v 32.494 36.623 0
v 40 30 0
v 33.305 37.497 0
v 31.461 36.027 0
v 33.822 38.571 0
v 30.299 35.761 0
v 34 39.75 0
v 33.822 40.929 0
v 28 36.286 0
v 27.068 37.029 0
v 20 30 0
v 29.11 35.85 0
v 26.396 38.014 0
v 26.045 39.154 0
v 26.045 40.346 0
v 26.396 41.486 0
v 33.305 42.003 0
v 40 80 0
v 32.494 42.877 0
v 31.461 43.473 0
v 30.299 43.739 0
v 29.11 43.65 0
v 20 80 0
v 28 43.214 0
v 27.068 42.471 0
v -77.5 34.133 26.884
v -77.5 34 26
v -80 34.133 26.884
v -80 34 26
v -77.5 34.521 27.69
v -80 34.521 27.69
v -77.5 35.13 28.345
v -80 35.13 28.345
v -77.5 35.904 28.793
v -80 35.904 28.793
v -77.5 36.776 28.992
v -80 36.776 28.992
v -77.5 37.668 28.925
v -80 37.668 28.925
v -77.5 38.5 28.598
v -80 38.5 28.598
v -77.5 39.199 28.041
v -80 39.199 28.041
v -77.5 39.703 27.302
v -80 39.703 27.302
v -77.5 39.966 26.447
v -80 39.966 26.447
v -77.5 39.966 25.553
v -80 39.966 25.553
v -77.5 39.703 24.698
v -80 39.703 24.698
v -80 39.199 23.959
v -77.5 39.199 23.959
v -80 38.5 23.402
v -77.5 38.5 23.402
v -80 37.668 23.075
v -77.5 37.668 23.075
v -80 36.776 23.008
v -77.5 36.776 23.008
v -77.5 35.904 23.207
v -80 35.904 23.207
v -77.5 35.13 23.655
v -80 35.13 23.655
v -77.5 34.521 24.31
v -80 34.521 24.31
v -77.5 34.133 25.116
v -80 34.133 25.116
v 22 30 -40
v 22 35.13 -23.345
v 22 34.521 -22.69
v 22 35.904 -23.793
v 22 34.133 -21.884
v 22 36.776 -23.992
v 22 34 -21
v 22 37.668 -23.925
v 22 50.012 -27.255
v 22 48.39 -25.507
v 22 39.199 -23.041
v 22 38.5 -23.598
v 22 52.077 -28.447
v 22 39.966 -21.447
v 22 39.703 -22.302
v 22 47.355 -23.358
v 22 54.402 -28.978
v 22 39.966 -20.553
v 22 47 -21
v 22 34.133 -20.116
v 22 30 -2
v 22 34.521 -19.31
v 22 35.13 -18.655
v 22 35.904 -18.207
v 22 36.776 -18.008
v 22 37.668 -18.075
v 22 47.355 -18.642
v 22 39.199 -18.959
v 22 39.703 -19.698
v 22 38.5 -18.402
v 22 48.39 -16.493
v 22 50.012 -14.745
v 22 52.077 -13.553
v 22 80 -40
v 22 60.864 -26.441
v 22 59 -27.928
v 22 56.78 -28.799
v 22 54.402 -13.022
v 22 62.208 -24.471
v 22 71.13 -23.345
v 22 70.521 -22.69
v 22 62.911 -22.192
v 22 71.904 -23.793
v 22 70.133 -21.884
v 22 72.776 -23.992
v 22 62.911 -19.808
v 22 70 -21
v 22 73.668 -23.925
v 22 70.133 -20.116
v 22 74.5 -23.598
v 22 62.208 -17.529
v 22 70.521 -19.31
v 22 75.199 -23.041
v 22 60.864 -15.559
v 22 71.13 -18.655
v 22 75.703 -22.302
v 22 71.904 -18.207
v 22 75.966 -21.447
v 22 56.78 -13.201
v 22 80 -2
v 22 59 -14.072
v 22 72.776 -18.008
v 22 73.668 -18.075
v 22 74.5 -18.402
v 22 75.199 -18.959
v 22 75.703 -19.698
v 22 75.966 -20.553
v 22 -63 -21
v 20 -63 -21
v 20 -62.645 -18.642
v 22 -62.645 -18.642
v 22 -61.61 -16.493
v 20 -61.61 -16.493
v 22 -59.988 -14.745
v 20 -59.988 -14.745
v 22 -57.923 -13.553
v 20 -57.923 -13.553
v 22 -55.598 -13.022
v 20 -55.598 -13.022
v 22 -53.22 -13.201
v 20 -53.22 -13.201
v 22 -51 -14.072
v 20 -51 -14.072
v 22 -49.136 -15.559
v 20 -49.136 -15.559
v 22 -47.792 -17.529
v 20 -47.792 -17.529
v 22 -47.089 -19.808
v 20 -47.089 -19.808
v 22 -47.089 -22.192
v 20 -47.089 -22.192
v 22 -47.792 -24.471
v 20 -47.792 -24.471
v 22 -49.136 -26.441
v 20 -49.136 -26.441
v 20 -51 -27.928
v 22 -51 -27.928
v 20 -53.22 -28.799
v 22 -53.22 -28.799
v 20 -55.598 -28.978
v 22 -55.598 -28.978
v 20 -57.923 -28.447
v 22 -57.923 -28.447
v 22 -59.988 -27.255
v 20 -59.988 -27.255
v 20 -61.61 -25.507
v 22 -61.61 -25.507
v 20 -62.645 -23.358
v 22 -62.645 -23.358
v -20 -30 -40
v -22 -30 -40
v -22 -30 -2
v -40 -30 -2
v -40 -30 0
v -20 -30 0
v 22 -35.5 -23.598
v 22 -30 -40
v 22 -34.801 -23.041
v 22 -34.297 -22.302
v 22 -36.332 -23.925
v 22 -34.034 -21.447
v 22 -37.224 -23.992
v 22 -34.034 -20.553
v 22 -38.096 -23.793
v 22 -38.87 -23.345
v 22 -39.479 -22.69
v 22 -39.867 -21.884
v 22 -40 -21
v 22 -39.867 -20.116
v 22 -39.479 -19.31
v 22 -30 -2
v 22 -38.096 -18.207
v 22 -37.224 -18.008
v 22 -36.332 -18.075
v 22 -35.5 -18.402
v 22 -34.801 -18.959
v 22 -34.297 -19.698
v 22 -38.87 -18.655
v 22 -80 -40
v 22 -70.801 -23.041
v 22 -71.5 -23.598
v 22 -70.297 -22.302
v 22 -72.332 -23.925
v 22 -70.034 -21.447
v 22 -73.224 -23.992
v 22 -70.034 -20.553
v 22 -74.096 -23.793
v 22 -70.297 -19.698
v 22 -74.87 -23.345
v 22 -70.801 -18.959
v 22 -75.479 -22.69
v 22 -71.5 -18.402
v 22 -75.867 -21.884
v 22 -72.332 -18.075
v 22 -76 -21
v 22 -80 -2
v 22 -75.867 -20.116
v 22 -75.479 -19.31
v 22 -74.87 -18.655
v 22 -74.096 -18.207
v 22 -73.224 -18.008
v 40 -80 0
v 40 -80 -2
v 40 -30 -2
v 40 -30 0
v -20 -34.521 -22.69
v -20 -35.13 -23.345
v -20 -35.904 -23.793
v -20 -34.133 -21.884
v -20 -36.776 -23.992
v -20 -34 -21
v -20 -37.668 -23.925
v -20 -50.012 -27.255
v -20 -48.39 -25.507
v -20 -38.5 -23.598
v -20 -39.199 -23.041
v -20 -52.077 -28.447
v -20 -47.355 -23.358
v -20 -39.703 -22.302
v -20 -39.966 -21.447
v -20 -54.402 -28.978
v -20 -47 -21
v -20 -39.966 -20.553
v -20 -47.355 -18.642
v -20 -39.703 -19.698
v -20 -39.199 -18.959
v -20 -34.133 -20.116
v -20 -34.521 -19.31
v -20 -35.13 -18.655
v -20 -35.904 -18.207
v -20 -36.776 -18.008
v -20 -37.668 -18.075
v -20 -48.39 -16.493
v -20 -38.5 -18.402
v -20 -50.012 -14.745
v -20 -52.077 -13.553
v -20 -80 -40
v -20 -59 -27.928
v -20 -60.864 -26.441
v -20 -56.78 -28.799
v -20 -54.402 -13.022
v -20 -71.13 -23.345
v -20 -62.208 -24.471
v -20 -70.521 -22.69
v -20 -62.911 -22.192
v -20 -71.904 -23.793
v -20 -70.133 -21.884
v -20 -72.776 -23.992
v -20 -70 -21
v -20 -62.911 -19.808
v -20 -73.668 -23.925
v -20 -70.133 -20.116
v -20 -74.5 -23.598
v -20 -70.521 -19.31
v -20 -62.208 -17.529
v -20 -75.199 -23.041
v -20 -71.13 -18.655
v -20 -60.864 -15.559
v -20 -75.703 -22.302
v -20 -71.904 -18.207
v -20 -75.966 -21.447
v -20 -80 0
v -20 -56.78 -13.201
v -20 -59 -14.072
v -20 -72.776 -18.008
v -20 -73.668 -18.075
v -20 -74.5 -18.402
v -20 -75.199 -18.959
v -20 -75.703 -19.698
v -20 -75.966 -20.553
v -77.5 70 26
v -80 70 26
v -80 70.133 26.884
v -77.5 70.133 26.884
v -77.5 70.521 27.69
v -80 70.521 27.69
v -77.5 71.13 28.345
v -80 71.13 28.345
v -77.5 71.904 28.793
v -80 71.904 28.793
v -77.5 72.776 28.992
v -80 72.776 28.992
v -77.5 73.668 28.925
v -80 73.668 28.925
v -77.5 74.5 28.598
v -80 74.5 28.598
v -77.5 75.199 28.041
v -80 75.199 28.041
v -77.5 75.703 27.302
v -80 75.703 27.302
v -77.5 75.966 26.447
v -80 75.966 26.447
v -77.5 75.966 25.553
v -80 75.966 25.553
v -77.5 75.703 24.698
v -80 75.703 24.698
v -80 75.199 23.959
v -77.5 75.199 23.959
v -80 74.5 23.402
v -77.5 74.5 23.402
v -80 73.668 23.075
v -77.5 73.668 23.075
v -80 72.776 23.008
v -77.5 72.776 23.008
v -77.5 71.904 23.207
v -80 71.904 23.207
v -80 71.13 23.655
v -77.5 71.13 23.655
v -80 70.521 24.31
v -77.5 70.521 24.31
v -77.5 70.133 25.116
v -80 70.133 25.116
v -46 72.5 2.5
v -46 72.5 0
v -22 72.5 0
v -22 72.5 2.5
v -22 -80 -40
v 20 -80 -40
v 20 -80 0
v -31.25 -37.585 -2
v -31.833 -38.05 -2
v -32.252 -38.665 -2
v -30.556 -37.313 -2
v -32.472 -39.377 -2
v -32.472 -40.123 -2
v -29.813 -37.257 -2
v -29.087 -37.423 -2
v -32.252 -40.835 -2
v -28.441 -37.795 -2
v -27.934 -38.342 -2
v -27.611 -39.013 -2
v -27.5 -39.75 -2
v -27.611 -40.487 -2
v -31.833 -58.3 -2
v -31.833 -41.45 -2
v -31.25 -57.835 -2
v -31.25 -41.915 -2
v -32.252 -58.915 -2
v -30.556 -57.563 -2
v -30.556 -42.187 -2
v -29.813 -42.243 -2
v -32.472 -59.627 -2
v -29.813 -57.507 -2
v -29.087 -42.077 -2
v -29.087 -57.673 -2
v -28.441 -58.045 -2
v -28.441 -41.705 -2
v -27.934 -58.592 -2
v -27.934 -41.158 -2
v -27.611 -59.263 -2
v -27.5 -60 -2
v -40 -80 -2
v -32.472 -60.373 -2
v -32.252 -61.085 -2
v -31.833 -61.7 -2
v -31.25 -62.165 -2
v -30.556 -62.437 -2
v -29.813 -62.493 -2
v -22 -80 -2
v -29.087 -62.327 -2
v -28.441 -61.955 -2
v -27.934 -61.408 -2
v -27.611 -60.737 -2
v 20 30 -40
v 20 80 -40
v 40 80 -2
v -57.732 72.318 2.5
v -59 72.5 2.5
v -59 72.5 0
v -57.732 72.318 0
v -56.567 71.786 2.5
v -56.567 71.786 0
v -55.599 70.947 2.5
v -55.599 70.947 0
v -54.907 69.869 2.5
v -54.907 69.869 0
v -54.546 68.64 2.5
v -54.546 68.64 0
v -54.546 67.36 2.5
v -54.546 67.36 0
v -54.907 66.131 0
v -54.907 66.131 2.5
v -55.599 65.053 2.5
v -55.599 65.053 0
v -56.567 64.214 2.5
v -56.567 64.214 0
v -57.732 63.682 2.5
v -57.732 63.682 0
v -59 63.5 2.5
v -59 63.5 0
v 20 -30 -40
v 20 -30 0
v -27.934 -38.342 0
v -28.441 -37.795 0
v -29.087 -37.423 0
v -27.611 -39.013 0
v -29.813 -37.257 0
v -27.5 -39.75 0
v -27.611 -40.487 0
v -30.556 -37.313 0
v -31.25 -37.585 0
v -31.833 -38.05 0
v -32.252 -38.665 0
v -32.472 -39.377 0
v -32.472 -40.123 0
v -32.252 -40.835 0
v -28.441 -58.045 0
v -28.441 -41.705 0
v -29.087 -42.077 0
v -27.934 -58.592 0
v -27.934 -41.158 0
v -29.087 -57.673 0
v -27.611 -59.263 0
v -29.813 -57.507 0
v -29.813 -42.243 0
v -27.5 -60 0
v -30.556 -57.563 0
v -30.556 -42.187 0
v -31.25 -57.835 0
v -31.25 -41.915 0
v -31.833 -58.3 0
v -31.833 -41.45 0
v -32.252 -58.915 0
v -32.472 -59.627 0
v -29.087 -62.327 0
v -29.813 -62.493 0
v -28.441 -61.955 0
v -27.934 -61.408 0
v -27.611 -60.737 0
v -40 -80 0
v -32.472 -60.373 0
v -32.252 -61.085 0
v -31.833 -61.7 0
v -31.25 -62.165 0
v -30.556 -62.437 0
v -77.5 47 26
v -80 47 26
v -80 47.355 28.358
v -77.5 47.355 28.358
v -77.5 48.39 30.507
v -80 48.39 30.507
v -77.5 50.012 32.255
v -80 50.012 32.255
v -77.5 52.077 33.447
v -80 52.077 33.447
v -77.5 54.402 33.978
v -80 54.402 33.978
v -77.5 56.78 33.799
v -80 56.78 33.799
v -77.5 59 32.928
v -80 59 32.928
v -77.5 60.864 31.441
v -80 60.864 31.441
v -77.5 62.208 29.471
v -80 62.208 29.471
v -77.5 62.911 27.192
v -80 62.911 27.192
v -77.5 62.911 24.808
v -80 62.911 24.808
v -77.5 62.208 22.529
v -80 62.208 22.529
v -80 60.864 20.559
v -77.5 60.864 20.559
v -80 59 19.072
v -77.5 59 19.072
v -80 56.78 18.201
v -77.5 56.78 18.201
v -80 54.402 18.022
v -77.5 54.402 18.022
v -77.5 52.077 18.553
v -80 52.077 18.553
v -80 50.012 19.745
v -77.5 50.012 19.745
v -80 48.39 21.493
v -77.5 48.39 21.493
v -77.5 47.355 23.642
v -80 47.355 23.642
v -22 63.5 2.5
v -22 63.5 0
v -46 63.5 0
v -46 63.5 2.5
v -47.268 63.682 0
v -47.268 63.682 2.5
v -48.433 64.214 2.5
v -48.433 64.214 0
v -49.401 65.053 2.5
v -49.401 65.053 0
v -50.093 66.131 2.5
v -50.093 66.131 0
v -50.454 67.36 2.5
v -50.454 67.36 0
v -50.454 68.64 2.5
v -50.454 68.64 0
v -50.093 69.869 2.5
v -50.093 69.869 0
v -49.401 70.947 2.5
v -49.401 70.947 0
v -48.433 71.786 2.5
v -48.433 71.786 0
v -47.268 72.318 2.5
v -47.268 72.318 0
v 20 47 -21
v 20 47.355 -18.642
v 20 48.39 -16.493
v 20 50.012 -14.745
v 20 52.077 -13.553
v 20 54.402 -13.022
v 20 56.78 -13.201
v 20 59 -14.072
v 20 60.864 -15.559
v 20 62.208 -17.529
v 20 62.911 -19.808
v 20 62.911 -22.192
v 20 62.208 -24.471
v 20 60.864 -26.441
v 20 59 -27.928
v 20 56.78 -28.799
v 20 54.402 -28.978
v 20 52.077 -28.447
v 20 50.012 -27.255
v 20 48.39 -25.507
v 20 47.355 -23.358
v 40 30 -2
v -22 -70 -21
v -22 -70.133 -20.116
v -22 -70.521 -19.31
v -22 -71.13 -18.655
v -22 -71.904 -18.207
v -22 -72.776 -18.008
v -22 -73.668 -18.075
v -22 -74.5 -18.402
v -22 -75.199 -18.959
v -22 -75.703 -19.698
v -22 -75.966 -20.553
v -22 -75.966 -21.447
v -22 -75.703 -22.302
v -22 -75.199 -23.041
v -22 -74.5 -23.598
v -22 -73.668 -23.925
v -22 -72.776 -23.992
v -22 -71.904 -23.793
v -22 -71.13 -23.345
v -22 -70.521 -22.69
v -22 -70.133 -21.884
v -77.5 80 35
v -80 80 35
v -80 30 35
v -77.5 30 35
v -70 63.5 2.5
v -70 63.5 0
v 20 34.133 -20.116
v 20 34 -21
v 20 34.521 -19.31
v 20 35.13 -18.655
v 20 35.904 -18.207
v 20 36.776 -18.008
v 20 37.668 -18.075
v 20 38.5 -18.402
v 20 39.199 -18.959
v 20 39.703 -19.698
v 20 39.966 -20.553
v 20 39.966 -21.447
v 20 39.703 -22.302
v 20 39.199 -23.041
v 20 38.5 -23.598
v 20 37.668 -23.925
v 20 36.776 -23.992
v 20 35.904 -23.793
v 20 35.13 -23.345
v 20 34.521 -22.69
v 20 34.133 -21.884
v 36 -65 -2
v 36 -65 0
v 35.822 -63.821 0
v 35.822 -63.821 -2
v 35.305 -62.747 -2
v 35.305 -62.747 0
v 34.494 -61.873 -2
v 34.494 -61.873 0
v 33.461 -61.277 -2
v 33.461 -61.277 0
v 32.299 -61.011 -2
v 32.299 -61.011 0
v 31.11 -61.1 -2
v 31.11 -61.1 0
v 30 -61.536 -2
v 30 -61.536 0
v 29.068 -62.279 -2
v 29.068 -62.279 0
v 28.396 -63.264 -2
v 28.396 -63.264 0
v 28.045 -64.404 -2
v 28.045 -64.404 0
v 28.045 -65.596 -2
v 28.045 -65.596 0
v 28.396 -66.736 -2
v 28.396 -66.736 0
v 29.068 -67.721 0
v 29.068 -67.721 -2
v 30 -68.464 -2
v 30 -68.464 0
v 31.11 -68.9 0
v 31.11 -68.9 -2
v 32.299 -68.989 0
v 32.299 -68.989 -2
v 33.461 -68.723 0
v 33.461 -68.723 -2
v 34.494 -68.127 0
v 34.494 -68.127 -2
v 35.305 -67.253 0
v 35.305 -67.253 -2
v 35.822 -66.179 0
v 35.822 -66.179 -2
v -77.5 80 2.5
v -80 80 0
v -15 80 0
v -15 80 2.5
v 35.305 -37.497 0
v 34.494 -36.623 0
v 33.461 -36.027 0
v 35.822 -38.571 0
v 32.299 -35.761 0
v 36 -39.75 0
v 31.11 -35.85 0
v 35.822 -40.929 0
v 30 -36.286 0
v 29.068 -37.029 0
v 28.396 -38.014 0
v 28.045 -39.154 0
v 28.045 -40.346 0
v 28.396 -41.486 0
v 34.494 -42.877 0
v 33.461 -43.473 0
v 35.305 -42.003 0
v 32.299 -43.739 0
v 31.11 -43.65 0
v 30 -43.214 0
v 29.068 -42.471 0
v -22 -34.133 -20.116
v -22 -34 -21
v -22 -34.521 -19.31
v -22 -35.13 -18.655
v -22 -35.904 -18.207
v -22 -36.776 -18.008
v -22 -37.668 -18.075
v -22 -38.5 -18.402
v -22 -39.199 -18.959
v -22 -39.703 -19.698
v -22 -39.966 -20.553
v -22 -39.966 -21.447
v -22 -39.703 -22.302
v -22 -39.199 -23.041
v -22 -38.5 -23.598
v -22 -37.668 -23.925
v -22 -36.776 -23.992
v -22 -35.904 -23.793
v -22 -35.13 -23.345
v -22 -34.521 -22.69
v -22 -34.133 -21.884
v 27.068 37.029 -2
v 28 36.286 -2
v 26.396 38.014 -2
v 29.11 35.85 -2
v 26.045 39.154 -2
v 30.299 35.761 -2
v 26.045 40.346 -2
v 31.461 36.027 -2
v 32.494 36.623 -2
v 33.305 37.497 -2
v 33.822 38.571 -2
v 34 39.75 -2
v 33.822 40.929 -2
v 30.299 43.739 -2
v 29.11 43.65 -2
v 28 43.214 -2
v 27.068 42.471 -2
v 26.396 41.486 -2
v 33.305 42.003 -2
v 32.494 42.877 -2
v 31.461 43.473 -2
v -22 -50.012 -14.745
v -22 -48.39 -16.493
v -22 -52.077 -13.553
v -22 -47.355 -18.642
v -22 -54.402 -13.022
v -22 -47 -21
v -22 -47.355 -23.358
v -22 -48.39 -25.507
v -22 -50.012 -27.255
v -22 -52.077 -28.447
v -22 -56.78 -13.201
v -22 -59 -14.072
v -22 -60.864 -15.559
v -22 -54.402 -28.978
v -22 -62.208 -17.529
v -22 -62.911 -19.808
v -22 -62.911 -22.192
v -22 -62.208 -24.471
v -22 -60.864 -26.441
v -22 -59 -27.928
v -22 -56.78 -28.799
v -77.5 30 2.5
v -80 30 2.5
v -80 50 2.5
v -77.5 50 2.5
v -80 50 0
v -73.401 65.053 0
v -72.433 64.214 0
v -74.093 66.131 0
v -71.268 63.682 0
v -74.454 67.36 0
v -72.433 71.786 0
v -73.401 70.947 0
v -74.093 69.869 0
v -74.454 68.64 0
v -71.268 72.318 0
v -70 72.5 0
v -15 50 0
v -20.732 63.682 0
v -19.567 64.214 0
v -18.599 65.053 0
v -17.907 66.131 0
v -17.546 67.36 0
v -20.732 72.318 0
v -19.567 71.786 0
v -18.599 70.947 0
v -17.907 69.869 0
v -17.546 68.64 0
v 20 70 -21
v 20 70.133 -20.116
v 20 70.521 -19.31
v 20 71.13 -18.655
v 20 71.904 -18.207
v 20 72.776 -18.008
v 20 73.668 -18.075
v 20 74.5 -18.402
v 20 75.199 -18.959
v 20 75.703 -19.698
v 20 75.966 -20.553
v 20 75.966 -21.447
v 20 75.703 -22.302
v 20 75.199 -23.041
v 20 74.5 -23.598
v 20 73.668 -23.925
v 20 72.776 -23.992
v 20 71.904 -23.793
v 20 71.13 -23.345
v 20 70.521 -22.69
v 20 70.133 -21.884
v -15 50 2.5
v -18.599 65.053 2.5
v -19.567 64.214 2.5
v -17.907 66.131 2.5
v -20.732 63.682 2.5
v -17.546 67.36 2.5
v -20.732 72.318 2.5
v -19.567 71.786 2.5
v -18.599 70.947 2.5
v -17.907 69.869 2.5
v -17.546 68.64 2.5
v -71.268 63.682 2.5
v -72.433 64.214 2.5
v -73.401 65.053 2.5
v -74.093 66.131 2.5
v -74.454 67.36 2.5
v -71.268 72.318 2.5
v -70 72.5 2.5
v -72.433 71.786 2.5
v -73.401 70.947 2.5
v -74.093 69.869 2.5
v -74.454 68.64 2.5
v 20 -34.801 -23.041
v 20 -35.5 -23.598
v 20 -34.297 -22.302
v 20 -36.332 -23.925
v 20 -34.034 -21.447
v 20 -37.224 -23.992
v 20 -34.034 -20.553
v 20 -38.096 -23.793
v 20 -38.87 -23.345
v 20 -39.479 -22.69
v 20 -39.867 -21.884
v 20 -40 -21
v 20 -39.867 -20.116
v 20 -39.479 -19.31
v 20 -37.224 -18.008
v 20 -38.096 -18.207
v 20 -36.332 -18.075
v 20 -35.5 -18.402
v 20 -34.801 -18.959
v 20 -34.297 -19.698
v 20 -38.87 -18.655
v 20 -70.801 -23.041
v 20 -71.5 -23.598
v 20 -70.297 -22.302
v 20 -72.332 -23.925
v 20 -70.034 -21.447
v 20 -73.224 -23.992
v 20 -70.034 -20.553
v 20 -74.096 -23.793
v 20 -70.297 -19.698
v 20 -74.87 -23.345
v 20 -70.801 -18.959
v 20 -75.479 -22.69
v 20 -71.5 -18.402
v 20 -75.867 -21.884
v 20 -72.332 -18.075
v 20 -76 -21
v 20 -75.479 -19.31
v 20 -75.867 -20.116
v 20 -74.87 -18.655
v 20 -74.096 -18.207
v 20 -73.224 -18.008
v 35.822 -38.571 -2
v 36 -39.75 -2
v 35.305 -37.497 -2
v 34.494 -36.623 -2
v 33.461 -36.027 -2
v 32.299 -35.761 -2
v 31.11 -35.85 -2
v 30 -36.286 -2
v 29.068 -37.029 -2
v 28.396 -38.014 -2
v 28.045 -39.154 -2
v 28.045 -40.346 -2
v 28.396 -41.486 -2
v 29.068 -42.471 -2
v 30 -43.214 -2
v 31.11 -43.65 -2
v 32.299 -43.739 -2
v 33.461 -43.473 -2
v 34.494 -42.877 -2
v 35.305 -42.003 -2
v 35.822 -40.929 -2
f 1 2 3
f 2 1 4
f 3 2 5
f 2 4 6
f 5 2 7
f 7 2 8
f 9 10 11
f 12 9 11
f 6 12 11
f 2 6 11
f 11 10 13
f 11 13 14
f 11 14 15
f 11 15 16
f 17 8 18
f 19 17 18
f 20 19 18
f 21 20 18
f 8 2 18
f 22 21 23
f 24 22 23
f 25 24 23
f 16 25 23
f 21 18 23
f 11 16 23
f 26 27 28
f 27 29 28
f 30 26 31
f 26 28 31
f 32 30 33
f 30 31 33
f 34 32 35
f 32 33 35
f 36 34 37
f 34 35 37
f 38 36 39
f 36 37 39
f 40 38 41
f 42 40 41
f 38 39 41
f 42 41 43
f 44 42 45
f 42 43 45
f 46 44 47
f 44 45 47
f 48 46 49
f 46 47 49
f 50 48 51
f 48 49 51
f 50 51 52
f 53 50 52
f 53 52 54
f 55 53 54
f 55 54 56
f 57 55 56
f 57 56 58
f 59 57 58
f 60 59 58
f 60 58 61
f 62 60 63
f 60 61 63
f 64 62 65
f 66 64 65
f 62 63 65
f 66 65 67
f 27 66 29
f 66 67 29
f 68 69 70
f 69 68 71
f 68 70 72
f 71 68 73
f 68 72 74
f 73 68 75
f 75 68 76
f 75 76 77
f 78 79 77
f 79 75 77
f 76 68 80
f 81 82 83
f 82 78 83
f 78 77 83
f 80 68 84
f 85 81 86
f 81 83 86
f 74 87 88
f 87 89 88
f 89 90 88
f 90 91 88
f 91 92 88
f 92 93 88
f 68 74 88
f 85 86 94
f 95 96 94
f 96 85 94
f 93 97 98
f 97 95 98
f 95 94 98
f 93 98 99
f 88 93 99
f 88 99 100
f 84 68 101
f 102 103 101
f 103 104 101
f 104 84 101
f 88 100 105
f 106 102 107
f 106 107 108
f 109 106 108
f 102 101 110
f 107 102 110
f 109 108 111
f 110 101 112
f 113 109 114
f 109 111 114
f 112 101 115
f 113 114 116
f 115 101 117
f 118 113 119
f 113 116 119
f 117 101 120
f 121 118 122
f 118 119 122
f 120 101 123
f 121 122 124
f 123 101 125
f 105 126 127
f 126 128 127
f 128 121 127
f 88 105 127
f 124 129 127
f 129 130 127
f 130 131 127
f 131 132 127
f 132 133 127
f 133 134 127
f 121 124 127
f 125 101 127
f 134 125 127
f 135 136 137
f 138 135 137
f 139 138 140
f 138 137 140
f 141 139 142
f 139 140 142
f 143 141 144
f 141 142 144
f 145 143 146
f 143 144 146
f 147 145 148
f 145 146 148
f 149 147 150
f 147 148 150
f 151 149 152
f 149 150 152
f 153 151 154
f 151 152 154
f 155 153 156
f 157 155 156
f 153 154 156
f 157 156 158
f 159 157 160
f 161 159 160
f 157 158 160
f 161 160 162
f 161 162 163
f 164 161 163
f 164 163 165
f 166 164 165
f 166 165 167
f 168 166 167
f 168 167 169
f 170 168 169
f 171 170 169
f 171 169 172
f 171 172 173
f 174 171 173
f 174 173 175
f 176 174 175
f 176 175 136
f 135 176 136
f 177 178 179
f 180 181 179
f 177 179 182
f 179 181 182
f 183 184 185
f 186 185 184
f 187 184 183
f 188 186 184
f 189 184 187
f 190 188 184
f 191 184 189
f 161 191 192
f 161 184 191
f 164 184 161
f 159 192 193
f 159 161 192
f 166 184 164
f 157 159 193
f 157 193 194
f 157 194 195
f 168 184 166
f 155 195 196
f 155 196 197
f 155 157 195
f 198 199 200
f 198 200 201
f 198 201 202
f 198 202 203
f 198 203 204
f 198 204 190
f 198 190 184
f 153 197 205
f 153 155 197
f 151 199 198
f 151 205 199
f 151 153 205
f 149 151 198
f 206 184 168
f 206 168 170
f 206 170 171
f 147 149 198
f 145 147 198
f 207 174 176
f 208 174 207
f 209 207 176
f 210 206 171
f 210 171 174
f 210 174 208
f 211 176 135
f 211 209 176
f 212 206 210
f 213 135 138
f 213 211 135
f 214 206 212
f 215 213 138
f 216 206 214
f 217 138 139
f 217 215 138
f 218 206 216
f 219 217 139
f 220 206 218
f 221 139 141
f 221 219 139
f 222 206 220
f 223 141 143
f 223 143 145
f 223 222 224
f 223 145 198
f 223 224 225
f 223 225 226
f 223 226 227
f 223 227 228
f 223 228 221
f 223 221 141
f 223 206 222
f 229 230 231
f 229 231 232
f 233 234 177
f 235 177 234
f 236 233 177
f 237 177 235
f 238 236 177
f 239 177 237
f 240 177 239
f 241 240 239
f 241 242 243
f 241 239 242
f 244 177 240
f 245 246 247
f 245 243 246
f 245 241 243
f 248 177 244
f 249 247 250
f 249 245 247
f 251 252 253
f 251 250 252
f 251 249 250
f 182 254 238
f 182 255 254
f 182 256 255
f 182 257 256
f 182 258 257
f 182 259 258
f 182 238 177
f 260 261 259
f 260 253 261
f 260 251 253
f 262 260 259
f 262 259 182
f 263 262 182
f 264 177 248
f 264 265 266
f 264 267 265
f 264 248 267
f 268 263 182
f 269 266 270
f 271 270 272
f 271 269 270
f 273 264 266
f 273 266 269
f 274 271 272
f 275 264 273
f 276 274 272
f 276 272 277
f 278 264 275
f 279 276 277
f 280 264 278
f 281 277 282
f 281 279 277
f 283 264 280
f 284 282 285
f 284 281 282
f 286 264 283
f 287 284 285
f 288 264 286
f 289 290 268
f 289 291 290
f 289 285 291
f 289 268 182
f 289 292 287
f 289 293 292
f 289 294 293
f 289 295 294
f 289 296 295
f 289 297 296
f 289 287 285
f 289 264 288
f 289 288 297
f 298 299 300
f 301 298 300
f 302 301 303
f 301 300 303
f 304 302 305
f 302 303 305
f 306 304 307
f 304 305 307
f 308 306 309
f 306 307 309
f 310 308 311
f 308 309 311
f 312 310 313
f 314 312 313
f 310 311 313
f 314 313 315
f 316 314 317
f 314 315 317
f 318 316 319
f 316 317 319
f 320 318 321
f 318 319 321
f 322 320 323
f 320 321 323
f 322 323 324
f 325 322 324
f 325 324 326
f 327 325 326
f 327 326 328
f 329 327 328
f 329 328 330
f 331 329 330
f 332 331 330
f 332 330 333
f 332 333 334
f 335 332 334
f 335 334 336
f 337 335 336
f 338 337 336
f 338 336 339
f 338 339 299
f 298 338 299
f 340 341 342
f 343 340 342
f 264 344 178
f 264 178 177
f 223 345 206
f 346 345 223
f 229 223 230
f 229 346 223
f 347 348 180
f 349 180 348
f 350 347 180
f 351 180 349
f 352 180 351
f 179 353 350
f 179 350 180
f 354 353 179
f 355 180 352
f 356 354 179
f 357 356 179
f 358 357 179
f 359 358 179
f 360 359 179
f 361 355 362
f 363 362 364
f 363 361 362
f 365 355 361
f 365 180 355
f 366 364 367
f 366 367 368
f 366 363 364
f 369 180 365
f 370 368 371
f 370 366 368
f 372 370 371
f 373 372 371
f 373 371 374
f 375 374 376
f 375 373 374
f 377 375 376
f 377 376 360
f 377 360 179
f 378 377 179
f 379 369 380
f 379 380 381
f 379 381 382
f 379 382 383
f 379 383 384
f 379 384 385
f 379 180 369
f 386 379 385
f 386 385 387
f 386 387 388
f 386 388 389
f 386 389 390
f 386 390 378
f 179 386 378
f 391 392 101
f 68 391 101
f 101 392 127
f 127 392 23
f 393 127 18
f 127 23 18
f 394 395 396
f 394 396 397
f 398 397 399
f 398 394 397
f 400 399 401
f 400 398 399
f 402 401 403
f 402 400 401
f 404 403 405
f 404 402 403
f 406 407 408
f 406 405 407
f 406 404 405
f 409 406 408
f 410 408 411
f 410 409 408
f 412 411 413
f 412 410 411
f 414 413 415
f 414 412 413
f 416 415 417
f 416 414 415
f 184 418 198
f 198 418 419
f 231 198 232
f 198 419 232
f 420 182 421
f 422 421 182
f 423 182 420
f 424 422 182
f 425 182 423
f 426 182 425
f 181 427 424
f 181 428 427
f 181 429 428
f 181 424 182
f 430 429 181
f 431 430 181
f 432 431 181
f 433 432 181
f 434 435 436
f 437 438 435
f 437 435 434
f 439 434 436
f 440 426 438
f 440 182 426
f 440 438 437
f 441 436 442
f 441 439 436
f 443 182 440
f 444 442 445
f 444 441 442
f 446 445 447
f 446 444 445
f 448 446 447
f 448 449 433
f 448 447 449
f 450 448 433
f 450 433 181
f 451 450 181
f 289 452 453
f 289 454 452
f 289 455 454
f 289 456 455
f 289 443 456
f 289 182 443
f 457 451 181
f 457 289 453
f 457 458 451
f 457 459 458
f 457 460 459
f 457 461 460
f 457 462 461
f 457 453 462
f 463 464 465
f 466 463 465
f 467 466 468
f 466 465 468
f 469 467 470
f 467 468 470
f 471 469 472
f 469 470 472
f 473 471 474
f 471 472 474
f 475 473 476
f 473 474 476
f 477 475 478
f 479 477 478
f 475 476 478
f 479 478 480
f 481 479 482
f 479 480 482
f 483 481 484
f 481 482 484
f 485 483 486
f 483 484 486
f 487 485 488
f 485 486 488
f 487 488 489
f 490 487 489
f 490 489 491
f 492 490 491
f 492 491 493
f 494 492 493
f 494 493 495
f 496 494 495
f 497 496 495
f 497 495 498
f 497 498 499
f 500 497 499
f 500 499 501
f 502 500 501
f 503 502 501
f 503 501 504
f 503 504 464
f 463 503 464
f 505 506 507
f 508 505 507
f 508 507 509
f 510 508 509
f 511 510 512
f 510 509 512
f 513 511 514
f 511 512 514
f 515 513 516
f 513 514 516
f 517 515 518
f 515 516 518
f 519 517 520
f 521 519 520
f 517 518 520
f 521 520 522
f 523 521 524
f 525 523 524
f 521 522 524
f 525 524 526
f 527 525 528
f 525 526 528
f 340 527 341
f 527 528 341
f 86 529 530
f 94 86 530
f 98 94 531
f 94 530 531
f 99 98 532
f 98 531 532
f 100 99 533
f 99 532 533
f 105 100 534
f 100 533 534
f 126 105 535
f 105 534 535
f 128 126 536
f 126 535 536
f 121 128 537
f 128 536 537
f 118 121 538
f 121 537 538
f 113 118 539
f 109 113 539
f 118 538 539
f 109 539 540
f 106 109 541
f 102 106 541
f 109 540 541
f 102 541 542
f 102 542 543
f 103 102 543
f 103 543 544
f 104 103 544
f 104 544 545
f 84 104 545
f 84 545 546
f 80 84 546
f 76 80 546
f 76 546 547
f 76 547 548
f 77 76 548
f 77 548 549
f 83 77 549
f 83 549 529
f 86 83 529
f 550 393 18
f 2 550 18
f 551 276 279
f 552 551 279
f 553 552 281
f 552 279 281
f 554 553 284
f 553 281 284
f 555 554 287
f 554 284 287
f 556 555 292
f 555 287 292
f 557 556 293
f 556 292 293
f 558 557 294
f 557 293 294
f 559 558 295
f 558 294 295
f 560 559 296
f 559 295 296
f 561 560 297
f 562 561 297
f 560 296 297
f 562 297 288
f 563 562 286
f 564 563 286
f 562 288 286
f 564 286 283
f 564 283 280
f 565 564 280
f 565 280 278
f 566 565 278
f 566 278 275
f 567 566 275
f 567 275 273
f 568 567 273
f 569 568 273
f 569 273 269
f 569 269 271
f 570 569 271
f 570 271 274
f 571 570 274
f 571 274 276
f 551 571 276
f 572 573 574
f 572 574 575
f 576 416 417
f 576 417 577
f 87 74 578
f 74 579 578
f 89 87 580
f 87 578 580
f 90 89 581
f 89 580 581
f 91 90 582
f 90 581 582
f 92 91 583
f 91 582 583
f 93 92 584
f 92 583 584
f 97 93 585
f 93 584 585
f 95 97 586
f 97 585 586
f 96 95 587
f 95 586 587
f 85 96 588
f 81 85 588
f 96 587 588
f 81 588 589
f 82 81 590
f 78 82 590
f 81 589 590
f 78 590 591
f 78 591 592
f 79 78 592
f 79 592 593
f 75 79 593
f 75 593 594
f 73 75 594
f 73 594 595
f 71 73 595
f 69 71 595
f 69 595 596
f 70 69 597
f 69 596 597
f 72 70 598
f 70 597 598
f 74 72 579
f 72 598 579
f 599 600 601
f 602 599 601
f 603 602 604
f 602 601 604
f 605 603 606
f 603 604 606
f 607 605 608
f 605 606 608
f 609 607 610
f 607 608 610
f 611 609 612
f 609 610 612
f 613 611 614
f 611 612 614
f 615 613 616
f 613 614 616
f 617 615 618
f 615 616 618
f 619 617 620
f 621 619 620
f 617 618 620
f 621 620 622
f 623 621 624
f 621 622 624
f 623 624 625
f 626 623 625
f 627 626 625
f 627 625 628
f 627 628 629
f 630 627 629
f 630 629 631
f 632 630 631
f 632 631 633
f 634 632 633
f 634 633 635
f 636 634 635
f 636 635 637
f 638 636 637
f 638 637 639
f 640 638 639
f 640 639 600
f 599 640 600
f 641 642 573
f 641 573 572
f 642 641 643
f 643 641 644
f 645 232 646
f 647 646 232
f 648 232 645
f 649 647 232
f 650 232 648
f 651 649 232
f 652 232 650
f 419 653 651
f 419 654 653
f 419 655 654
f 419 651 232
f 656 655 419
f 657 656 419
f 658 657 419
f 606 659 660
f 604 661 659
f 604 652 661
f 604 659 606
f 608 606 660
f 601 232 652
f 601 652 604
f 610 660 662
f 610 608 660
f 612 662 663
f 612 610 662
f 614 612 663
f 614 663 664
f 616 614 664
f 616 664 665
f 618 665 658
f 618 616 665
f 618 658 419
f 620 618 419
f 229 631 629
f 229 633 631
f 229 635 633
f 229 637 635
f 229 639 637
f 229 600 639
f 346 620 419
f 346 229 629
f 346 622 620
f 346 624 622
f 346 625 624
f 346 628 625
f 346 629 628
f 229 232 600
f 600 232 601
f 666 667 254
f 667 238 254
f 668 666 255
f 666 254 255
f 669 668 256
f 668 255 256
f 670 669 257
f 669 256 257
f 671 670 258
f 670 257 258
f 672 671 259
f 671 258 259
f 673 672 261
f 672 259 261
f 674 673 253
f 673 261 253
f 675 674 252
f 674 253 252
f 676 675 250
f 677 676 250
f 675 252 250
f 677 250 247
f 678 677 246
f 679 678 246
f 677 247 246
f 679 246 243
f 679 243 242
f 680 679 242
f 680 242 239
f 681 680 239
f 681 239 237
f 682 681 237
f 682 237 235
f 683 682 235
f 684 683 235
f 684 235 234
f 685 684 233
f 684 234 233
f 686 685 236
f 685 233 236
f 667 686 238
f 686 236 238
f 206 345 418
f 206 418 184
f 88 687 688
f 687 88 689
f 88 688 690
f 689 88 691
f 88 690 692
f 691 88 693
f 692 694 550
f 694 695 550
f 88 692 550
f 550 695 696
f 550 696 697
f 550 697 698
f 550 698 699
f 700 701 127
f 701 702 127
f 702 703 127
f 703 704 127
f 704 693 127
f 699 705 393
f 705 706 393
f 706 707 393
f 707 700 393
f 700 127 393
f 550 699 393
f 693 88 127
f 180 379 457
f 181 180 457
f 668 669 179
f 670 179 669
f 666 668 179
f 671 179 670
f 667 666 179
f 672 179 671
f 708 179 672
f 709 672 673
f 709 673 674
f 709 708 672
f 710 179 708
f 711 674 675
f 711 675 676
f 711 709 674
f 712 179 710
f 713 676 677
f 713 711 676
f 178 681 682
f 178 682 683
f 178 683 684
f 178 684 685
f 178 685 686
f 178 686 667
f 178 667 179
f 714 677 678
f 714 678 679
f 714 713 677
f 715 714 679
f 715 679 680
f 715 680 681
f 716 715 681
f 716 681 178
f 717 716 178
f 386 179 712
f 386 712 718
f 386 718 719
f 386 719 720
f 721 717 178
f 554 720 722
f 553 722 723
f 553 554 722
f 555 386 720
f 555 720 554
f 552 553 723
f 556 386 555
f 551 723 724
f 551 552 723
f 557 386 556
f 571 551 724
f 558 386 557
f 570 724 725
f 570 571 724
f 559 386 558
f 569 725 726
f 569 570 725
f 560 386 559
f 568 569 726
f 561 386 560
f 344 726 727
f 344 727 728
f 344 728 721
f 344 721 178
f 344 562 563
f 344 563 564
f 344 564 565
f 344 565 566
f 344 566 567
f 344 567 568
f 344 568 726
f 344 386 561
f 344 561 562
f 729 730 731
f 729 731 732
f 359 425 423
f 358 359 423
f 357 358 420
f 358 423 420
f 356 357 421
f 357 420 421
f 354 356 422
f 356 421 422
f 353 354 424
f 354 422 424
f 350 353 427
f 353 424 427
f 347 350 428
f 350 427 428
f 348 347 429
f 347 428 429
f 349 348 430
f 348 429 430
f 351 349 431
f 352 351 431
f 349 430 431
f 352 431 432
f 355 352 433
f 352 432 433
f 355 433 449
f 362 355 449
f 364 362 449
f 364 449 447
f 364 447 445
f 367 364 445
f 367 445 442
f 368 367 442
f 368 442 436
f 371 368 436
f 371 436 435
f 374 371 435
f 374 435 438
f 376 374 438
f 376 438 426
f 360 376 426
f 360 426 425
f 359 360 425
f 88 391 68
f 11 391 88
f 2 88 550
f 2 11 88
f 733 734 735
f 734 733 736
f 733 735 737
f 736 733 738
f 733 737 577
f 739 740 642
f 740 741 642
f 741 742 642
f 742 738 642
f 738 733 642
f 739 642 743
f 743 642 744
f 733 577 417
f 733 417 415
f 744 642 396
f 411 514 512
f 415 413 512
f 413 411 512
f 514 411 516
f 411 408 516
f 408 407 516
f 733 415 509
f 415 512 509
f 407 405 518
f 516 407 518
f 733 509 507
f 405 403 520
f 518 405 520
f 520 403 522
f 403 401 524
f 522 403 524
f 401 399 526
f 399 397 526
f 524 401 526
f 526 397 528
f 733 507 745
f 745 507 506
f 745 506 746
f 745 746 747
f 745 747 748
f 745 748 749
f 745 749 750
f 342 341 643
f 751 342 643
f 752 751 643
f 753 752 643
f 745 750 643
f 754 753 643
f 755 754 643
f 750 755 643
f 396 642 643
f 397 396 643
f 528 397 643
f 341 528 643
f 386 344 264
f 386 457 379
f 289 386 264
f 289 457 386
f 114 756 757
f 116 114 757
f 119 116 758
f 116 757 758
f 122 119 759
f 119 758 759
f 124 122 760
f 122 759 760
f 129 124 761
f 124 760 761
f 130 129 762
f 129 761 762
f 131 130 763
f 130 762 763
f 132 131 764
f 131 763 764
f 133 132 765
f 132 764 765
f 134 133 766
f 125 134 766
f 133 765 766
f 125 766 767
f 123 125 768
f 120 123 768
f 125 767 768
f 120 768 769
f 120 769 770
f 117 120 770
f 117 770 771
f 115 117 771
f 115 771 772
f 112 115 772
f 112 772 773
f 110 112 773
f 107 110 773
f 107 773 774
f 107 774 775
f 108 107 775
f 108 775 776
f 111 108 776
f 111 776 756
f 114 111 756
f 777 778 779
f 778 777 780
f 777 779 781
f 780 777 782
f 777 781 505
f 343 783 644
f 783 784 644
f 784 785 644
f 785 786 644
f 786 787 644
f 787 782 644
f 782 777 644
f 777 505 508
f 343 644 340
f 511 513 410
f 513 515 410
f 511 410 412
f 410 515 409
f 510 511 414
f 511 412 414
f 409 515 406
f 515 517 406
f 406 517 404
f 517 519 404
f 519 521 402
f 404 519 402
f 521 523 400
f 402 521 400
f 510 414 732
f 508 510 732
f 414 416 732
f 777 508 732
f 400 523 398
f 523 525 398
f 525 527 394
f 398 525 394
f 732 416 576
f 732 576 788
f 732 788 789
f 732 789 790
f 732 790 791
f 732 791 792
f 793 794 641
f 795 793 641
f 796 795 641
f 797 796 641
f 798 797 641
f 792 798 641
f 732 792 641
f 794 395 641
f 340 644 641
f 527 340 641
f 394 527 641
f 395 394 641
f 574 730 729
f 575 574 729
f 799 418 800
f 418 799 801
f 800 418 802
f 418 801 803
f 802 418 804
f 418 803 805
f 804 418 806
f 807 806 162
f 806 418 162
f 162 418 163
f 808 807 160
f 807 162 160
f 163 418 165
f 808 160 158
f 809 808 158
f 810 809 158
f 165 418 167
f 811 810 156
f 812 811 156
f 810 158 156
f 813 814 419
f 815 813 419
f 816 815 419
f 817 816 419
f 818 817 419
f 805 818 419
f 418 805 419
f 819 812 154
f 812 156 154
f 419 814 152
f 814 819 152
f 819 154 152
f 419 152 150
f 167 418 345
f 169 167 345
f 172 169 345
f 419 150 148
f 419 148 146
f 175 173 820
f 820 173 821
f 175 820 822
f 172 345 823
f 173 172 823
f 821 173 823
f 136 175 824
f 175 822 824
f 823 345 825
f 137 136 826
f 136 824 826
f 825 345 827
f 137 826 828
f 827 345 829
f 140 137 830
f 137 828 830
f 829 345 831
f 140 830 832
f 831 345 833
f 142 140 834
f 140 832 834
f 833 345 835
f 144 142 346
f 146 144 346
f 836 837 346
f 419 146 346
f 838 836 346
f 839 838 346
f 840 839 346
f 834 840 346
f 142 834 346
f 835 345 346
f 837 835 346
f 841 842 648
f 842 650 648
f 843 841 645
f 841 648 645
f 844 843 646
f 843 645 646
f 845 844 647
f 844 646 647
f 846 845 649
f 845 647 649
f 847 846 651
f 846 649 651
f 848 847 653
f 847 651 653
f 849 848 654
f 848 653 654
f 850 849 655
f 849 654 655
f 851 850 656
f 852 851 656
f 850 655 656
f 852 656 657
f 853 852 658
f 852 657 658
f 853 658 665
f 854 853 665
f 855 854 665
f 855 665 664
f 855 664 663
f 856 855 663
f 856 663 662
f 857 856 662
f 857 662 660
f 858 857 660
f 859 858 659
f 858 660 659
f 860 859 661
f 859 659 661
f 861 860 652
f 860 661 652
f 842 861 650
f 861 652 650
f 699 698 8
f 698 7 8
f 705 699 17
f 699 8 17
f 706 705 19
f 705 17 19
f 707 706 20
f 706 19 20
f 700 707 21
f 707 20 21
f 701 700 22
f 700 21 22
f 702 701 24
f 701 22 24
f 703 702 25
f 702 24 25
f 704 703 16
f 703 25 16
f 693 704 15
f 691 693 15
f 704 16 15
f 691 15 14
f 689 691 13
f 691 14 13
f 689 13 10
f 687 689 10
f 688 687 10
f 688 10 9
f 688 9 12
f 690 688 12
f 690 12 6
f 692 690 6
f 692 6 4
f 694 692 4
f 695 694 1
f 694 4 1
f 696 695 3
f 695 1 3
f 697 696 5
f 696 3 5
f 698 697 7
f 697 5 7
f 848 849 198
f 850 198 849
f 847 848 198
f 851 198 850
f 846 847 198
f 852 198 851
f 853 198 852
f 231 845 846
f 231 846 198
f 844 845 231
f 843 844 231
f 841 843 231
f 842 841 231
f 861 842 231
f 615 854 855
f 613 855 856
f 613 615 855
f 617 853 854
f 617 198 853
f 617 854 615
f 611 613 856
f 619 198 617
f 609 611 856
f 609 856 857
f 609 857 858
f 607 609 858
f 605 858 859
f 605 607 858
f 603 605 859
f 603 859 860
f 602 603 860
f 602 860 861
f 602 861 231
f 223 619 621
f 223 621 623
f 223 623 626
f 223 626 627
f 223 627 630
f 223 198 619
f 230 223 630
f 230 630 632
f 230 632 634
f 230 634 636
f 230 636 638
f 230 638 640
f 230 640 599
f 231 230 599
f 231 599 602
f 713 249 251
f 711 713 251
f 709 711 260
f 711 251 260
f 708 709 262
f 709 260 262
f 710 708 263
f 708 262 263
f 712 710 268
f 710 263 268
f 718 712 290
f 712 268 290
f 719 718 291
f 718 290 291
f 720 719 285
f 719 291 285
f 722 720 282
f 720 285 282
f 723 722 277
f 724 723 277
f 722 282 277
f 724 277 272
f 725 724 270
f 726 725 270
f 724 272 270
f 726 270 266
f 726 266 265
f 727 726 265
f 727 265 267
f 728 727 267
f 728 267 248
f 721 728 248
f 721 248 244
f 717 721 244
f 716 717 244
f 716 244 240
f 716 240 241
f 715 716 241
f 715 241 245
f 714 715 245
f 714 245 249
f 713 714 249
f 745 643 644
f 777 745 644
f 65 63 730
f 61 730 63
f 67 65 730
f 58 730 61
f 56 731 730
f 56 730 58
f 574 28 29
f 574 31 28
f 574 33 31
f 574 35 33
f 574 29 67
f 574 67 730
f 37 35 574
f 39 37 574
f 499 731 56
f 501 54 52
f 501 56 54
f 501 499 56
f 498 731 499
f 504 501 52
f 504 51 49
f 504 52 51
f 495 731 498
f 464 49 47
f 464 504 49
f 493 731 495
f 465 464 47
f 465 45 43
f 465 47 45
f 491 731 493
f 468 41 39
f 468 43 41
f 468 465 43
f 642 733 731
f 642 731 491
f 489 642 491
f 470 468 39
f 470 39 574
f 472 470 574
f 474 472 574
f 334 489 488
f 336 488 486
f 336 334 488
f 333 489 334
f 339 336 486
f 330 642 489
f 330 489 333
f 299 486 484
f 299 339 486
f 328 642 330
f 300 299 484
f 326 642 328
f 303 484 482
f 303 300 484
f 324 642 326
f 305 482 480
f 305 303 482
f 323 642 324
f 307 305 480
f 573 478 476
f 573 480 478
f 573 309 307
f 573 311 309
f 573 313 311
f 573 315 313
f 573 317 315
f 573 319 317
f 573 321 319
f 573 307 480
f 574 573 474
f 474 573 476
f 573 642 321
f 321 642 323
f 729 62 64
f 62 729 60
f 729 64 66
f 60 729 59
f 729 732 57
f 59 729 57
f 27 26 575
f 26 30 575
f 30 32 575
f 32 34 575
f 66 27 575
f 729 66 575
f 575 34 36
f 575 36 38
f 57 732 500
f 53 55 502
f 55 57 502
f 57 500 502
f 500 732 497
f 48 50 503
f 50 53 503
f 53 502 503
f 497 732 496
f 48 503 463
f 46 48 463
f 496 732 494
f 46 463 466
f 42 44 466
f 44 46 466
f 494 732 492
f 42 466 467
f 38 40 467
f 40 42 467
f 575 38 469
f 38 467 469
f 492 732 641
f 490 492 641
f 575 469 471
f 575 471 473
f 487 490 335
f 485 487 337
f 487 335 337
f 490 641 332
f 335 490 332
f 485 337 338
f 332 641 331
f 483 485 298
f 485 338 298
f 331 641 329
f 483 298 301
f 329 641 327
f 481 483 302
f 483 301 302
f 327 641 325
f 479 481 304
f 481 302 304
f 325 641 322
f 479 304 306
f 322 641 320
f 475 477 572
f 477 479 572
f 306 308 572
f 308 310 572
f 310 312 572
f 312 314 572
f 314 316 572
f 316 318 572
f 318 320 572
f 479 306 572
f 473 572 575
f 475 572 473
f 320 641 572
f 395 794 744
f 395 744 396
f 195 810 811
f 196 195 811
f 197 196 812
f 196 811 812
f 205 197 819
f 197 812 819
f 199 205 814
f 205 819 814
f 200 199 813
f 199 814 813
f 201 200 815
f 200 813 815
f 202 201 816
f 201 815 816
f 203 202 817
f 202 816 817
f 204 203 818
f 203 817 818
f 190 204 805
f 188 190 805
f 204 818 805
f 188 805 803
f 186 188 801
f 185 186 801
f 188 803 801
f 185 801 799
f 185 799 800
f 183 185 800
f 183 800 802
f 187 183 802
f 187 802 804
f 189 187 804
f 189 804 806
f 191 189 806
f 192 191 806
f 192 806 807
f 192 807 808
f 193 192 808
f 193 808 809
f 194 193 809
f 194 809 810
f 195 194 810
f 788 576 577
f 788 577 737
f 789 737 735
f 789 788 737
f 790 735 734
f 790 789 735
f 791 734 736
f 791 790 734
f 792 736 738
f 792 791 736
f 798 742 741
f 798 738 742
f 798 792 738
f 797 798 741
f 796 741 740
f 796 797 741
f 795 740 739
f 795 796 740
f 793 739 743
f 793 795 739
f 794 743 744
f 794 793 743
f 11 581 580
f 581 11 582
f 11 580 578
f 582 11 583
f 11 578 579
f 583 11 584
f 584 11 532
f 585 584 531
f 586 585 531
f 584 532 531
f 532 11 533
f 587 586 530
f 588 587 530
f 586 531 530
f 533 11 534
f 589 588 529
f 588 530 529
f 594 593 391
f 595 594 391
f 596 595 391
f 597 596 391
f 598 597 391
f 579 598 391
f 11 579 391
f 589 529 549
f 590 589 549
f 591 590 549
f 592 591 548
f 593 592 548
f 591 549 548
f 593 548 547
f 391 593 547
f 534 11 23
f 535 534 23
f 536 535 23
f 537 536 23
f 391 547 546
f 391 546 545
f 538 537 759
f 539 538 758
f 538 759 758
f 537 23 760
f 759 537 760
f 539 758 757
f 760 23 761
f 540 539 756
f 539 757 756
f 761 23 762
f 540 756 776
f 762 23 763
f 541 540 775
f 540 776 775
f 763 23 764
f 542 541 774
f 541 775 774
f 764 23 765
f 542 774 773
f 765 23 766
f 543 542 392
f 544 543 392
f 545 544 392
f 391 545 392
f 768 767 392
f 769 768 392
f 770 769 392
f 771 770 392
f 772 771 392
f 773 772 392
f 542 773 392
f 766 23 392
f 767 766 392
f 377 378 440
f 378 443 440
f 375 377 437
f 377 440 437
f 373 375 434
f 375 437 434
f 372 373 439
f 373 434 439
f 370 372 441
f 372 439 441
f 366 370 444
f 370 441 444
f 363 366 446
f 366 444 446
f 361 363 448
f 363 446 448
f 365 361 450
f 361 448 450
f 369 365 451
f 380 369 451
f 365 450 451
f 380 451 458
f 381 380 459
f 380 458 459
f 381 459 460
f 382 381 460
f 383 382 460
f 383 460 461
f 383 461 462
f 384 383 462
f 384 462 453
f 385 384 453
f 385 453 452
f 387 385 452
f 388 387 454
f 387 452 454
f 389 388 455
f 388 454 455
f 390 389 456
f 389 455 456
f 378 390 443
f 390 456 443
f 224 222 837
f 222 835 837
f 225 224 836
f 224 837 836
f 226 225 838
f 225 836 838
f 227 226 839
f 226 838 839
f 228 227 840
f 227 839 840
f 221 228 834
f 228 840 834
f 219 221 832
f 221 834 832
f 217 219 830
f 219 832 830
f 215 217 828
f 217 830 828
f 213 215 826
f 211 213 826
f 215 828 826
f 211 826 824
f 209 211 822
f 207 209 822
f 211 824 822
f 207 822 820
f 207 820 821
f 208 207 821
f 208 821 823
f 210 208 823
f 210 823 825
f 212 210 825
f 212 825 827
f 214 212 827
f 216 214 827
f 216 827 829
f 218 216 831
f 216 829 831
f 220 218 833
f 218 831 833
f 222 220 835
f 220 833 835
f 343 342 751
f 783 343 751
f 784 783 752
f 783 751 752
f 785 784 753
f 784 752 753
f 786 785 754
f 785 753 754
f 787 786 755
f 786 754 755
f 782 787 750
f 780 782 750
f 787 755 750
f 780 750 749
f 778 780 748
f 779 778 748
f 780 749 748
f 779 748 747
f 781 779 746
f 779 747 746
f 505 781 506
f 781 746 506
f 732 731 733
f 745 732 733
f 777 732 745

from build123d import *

# Parameters (mm, degrees)
F2_W      = 18
F2_H      = 2
F2_W_2    = 2
F3_DEPTH  = 50
F2_H_2    = 38
F4_DEPTH  = 50
F5_R      = 3
F5_R_2    = 8
F7_DEPTH  = 5
F6_R      = 2.5
F8_DEPTH  = 5
F9_W      = 18
F9_H      = 2
F9_W_2    = 2
F10_DEPTH = 50
F9_H_2    = 38
F11_DEPTH = 50
F12_R     = 3
F12_R_2   = 8
F14_DEPTH = 5
F13_R     = 4
F15_DEPTH = 5
F16_W     = 62.5
F16_H     = 2.5
F16_W_2   = 2.5
F17_DEPTH = 30
F16_H_2   = 32.5
F18_DEPTH = 50
F19_R     = 3
F19_R_2   = 8
F21_DEPTH = 5
F22_DEPTH = 5
F23_W     = 18
F23_H     = 2
F23_W_2   = 2
F24_DEPTH = 50
F23_H_2   = 38
F25_DEPTH = 50
F26_R     = 3
F26_R_2   = 8
F28_DEPTH = 5
F27_R     = 4
F29_DEPTH = 5


with BuildPart() as f3:
    # F2 (on offset) → F3 (new body)
    with BuildSketch(Plane.XZ.offset(80)):
        with Locations((-31, -1)):
            Rectangle(F2_W, F2_H)
        with Locations((-21, -1)):
            Rectangle(F2_W_2, F2_H)
    extrude(amount=-F3_DEPTH)

    # F2 (on offset) → F4 (join)
    with BuildSketch(Plane.XZ.offset(80)):
        with Locations((-21, -21)):
            Rectangle(F2_W_2, F2_H_2)
        with Locations((-21, -1)):
            Rectangle(F2_W_2, F2_H)
    extrude(amount=-F4_DEPTH)

    # F5 (on face) → F7 (cut, symmetric)
    with BuildSketch(Plane.YZ.offset(-20)):
        with Locations((-73, -21)):
            Circle(F5_R)
        with Locations((-55, -21)):
            Circle(F5_R_2)
        with Locations((-37, -21)):
            Circle(F5_R)
    extrude(amount=F7_DEPTH, both=True, mode=Mode.SUBTRACT)

    # F6 (on face) → F8 (cut, symmetric)
    with BuildSketch(Plane.XY):
        with Locations((-30, -39.75)):
            Circle(F6_R)
        with Locations((-30, -60)):
            Circle(F6_R)
    extrude(amount=F8_DEPTH, both=True, mode=Mode.SUBTRACT)


with BuildPart() as f10:
    # F9 (on offset) → F10 (new body)
    with BuildSketch(Plane.XZ.offset(80)):
        with Locations((31, -1)):
            Rectangle(F9_W, F9_H)
        with Locations((21, -1)):
            Rectangle(F9_W_2, F9_H)
    extrude(amount=-F10_DEPTH)

    # F9 (on offset) → F11 (join)
    with BuildSketch(Plane.XZ.offset(80)):
        with Locations((21, -1)):
            Rectangle(F9_W_2, F9_H)
        with Locations((21, -21)):
            Rectangle(F9_W_2, F9_H_2)
    extrude(amount=-F11_DEPTH)

    # F12 (on face) → F14 (cut, symmetric)
    with BuildSketch(Plane(origin=(20, 0, 0), x_dir=(0, -1, 0), z_dir=(-1, 0, 0))):
        with Locations((37, -21)):
            Circle(F12_R)
        with Locations((55, -21)):
            Circle(F12_R_2)
        with Locations((73, -21)):
            Circle(F12_R)
    extrude(amount=F14_DEPTH, both=True, mode=Mode.SUBTRACT)

    # F13 (on face) → F15 (cut, symmetric)
    with BuildSketch(Plane.XY):
        with Locations((32, -65)):
            Circle(F13_R)
        with Locations((32, -39.75)):
            Circle(F13_R)
    extrude(amount=F15_DEPTH, both=True, mode=Mode.SUBTRACT)


with BuildPart() as f17:
    # F16 (on offset) → F17 (new body)
    with BuildSketch(Plane.XZ.offset(-80)):
        with Locations((-46.25, 1.25)):
            Rectangle(F16_W, F16_H)
        with Locations((-78.75, 1.25)):
            Rectangle(F16_W_2, F16_H)
    extrude(amount=F17_DEPTH)

    # F16 (on offset) → F18 (join)
    with BuildSketch(Plane.XZ.offset(-80)):
        with Locations((-78.75, 18.75)):
            Rectangle(F16_W_2, F16_H_2)
    extrude(amount=F18_DEPTH)

    # F19 (on face) → F21 (cut, symmetric)
    with BuildSketch(Plane(origin=(-80, 0, 0), x_dir=(0, -1, 0), z_dir=(-1, 0, 0))):
        with Locations((-73, 26)):
            Circle(F19_R)
        with Locations((-55, 26)):
            Circle(F19_R_2)
        with Locations((-37, 26)):
            Circle(F19_R)
    extrude(amount=F21_DEPTH, both=True, mode=Mode.SUBTRACT)

    # F20 (on face) → F22 (cut, symmetric)
    with BuildSketch(Plane(origin=(0, 0, 0), x_dir=(1, 0, 0), z_dir=(0, 0, -1))):
        with BuildLine():
            Line((-59, -63.5), (-70, -63.5))
            ThreePointArc((-70, -63.5), (-74.5, -68), (-70, -72.5))
            Line((-70, -72.5), (-59, -72.5))
            ThreePointArc((-59, -72.5), (-54.5, -68), (-59, -63.5))
        make_face()
        with BuildLine():
            Line((-22, -63.5), (-46, -63.5))
            ThreePointArc((-46, -63.5), (-50.5, -68), (-46, -72.5))
            Line((-46, -72.5), (-22, -72.5))
            ThreePointArc((-22, -72.5), (-17.5, -68), (-22, -63.5))
        make_face()
    extrude(amount=F22_DEPTH, both=True, mode=Mode.SUBTRACT)


with BuildPart() as f24:
    # F23 (on offset) → F24 (new body)
    with BuildSketch(Plane.XZ.offset(-80)):
        with Locations((31, -1)):
            Rectangle(F23_W, F23_H)
        with Locations((21, -1)):
            Rectangle(F23_W_2, F23_H)
    extrude(amount=F24_DEPTH)

    # F23 (on offset) → F25 (join)
    with BuildSketch(Plane.XZ.offset(-80)):
        with Locations((21, -21)):
            Rectangle(F23_W_2, F23_H_2)
        with Locations((21, -1)):
            Rectangle(F23_W_2, F23_H)
    extrude(amount=F25_DEPTH)

    # F26 (on face) → F28 (cut, symmetric)
    with BuildSketch(Plane(origin=(20, 0, 0), x_dir=(0, -1, 0), z_dir=(-1, 0, 0))):
        with Locations((-73, -21)):
            Circle(F26_R)
        with Locations((-55, -21)):
            Circle(F26_R_2)
        with Locations((-37, -21)):
            Circle(F26_R)
    extrude(amount=F28_DEPTH, both=True, mode=Mode.SUBTRACT)

    # F27 (on face) → F29 (cut, symmetric)
    with BuildSketch(Plane.XY):
        with Locations((30, 39.75)):
            Circle(F27_R)
    extrude(amount=F29_DEPTH, both=True, mode=Mode.SUBTRACT)


solid = Compound([f3.part, f10.part, f17.part, f24.part])
